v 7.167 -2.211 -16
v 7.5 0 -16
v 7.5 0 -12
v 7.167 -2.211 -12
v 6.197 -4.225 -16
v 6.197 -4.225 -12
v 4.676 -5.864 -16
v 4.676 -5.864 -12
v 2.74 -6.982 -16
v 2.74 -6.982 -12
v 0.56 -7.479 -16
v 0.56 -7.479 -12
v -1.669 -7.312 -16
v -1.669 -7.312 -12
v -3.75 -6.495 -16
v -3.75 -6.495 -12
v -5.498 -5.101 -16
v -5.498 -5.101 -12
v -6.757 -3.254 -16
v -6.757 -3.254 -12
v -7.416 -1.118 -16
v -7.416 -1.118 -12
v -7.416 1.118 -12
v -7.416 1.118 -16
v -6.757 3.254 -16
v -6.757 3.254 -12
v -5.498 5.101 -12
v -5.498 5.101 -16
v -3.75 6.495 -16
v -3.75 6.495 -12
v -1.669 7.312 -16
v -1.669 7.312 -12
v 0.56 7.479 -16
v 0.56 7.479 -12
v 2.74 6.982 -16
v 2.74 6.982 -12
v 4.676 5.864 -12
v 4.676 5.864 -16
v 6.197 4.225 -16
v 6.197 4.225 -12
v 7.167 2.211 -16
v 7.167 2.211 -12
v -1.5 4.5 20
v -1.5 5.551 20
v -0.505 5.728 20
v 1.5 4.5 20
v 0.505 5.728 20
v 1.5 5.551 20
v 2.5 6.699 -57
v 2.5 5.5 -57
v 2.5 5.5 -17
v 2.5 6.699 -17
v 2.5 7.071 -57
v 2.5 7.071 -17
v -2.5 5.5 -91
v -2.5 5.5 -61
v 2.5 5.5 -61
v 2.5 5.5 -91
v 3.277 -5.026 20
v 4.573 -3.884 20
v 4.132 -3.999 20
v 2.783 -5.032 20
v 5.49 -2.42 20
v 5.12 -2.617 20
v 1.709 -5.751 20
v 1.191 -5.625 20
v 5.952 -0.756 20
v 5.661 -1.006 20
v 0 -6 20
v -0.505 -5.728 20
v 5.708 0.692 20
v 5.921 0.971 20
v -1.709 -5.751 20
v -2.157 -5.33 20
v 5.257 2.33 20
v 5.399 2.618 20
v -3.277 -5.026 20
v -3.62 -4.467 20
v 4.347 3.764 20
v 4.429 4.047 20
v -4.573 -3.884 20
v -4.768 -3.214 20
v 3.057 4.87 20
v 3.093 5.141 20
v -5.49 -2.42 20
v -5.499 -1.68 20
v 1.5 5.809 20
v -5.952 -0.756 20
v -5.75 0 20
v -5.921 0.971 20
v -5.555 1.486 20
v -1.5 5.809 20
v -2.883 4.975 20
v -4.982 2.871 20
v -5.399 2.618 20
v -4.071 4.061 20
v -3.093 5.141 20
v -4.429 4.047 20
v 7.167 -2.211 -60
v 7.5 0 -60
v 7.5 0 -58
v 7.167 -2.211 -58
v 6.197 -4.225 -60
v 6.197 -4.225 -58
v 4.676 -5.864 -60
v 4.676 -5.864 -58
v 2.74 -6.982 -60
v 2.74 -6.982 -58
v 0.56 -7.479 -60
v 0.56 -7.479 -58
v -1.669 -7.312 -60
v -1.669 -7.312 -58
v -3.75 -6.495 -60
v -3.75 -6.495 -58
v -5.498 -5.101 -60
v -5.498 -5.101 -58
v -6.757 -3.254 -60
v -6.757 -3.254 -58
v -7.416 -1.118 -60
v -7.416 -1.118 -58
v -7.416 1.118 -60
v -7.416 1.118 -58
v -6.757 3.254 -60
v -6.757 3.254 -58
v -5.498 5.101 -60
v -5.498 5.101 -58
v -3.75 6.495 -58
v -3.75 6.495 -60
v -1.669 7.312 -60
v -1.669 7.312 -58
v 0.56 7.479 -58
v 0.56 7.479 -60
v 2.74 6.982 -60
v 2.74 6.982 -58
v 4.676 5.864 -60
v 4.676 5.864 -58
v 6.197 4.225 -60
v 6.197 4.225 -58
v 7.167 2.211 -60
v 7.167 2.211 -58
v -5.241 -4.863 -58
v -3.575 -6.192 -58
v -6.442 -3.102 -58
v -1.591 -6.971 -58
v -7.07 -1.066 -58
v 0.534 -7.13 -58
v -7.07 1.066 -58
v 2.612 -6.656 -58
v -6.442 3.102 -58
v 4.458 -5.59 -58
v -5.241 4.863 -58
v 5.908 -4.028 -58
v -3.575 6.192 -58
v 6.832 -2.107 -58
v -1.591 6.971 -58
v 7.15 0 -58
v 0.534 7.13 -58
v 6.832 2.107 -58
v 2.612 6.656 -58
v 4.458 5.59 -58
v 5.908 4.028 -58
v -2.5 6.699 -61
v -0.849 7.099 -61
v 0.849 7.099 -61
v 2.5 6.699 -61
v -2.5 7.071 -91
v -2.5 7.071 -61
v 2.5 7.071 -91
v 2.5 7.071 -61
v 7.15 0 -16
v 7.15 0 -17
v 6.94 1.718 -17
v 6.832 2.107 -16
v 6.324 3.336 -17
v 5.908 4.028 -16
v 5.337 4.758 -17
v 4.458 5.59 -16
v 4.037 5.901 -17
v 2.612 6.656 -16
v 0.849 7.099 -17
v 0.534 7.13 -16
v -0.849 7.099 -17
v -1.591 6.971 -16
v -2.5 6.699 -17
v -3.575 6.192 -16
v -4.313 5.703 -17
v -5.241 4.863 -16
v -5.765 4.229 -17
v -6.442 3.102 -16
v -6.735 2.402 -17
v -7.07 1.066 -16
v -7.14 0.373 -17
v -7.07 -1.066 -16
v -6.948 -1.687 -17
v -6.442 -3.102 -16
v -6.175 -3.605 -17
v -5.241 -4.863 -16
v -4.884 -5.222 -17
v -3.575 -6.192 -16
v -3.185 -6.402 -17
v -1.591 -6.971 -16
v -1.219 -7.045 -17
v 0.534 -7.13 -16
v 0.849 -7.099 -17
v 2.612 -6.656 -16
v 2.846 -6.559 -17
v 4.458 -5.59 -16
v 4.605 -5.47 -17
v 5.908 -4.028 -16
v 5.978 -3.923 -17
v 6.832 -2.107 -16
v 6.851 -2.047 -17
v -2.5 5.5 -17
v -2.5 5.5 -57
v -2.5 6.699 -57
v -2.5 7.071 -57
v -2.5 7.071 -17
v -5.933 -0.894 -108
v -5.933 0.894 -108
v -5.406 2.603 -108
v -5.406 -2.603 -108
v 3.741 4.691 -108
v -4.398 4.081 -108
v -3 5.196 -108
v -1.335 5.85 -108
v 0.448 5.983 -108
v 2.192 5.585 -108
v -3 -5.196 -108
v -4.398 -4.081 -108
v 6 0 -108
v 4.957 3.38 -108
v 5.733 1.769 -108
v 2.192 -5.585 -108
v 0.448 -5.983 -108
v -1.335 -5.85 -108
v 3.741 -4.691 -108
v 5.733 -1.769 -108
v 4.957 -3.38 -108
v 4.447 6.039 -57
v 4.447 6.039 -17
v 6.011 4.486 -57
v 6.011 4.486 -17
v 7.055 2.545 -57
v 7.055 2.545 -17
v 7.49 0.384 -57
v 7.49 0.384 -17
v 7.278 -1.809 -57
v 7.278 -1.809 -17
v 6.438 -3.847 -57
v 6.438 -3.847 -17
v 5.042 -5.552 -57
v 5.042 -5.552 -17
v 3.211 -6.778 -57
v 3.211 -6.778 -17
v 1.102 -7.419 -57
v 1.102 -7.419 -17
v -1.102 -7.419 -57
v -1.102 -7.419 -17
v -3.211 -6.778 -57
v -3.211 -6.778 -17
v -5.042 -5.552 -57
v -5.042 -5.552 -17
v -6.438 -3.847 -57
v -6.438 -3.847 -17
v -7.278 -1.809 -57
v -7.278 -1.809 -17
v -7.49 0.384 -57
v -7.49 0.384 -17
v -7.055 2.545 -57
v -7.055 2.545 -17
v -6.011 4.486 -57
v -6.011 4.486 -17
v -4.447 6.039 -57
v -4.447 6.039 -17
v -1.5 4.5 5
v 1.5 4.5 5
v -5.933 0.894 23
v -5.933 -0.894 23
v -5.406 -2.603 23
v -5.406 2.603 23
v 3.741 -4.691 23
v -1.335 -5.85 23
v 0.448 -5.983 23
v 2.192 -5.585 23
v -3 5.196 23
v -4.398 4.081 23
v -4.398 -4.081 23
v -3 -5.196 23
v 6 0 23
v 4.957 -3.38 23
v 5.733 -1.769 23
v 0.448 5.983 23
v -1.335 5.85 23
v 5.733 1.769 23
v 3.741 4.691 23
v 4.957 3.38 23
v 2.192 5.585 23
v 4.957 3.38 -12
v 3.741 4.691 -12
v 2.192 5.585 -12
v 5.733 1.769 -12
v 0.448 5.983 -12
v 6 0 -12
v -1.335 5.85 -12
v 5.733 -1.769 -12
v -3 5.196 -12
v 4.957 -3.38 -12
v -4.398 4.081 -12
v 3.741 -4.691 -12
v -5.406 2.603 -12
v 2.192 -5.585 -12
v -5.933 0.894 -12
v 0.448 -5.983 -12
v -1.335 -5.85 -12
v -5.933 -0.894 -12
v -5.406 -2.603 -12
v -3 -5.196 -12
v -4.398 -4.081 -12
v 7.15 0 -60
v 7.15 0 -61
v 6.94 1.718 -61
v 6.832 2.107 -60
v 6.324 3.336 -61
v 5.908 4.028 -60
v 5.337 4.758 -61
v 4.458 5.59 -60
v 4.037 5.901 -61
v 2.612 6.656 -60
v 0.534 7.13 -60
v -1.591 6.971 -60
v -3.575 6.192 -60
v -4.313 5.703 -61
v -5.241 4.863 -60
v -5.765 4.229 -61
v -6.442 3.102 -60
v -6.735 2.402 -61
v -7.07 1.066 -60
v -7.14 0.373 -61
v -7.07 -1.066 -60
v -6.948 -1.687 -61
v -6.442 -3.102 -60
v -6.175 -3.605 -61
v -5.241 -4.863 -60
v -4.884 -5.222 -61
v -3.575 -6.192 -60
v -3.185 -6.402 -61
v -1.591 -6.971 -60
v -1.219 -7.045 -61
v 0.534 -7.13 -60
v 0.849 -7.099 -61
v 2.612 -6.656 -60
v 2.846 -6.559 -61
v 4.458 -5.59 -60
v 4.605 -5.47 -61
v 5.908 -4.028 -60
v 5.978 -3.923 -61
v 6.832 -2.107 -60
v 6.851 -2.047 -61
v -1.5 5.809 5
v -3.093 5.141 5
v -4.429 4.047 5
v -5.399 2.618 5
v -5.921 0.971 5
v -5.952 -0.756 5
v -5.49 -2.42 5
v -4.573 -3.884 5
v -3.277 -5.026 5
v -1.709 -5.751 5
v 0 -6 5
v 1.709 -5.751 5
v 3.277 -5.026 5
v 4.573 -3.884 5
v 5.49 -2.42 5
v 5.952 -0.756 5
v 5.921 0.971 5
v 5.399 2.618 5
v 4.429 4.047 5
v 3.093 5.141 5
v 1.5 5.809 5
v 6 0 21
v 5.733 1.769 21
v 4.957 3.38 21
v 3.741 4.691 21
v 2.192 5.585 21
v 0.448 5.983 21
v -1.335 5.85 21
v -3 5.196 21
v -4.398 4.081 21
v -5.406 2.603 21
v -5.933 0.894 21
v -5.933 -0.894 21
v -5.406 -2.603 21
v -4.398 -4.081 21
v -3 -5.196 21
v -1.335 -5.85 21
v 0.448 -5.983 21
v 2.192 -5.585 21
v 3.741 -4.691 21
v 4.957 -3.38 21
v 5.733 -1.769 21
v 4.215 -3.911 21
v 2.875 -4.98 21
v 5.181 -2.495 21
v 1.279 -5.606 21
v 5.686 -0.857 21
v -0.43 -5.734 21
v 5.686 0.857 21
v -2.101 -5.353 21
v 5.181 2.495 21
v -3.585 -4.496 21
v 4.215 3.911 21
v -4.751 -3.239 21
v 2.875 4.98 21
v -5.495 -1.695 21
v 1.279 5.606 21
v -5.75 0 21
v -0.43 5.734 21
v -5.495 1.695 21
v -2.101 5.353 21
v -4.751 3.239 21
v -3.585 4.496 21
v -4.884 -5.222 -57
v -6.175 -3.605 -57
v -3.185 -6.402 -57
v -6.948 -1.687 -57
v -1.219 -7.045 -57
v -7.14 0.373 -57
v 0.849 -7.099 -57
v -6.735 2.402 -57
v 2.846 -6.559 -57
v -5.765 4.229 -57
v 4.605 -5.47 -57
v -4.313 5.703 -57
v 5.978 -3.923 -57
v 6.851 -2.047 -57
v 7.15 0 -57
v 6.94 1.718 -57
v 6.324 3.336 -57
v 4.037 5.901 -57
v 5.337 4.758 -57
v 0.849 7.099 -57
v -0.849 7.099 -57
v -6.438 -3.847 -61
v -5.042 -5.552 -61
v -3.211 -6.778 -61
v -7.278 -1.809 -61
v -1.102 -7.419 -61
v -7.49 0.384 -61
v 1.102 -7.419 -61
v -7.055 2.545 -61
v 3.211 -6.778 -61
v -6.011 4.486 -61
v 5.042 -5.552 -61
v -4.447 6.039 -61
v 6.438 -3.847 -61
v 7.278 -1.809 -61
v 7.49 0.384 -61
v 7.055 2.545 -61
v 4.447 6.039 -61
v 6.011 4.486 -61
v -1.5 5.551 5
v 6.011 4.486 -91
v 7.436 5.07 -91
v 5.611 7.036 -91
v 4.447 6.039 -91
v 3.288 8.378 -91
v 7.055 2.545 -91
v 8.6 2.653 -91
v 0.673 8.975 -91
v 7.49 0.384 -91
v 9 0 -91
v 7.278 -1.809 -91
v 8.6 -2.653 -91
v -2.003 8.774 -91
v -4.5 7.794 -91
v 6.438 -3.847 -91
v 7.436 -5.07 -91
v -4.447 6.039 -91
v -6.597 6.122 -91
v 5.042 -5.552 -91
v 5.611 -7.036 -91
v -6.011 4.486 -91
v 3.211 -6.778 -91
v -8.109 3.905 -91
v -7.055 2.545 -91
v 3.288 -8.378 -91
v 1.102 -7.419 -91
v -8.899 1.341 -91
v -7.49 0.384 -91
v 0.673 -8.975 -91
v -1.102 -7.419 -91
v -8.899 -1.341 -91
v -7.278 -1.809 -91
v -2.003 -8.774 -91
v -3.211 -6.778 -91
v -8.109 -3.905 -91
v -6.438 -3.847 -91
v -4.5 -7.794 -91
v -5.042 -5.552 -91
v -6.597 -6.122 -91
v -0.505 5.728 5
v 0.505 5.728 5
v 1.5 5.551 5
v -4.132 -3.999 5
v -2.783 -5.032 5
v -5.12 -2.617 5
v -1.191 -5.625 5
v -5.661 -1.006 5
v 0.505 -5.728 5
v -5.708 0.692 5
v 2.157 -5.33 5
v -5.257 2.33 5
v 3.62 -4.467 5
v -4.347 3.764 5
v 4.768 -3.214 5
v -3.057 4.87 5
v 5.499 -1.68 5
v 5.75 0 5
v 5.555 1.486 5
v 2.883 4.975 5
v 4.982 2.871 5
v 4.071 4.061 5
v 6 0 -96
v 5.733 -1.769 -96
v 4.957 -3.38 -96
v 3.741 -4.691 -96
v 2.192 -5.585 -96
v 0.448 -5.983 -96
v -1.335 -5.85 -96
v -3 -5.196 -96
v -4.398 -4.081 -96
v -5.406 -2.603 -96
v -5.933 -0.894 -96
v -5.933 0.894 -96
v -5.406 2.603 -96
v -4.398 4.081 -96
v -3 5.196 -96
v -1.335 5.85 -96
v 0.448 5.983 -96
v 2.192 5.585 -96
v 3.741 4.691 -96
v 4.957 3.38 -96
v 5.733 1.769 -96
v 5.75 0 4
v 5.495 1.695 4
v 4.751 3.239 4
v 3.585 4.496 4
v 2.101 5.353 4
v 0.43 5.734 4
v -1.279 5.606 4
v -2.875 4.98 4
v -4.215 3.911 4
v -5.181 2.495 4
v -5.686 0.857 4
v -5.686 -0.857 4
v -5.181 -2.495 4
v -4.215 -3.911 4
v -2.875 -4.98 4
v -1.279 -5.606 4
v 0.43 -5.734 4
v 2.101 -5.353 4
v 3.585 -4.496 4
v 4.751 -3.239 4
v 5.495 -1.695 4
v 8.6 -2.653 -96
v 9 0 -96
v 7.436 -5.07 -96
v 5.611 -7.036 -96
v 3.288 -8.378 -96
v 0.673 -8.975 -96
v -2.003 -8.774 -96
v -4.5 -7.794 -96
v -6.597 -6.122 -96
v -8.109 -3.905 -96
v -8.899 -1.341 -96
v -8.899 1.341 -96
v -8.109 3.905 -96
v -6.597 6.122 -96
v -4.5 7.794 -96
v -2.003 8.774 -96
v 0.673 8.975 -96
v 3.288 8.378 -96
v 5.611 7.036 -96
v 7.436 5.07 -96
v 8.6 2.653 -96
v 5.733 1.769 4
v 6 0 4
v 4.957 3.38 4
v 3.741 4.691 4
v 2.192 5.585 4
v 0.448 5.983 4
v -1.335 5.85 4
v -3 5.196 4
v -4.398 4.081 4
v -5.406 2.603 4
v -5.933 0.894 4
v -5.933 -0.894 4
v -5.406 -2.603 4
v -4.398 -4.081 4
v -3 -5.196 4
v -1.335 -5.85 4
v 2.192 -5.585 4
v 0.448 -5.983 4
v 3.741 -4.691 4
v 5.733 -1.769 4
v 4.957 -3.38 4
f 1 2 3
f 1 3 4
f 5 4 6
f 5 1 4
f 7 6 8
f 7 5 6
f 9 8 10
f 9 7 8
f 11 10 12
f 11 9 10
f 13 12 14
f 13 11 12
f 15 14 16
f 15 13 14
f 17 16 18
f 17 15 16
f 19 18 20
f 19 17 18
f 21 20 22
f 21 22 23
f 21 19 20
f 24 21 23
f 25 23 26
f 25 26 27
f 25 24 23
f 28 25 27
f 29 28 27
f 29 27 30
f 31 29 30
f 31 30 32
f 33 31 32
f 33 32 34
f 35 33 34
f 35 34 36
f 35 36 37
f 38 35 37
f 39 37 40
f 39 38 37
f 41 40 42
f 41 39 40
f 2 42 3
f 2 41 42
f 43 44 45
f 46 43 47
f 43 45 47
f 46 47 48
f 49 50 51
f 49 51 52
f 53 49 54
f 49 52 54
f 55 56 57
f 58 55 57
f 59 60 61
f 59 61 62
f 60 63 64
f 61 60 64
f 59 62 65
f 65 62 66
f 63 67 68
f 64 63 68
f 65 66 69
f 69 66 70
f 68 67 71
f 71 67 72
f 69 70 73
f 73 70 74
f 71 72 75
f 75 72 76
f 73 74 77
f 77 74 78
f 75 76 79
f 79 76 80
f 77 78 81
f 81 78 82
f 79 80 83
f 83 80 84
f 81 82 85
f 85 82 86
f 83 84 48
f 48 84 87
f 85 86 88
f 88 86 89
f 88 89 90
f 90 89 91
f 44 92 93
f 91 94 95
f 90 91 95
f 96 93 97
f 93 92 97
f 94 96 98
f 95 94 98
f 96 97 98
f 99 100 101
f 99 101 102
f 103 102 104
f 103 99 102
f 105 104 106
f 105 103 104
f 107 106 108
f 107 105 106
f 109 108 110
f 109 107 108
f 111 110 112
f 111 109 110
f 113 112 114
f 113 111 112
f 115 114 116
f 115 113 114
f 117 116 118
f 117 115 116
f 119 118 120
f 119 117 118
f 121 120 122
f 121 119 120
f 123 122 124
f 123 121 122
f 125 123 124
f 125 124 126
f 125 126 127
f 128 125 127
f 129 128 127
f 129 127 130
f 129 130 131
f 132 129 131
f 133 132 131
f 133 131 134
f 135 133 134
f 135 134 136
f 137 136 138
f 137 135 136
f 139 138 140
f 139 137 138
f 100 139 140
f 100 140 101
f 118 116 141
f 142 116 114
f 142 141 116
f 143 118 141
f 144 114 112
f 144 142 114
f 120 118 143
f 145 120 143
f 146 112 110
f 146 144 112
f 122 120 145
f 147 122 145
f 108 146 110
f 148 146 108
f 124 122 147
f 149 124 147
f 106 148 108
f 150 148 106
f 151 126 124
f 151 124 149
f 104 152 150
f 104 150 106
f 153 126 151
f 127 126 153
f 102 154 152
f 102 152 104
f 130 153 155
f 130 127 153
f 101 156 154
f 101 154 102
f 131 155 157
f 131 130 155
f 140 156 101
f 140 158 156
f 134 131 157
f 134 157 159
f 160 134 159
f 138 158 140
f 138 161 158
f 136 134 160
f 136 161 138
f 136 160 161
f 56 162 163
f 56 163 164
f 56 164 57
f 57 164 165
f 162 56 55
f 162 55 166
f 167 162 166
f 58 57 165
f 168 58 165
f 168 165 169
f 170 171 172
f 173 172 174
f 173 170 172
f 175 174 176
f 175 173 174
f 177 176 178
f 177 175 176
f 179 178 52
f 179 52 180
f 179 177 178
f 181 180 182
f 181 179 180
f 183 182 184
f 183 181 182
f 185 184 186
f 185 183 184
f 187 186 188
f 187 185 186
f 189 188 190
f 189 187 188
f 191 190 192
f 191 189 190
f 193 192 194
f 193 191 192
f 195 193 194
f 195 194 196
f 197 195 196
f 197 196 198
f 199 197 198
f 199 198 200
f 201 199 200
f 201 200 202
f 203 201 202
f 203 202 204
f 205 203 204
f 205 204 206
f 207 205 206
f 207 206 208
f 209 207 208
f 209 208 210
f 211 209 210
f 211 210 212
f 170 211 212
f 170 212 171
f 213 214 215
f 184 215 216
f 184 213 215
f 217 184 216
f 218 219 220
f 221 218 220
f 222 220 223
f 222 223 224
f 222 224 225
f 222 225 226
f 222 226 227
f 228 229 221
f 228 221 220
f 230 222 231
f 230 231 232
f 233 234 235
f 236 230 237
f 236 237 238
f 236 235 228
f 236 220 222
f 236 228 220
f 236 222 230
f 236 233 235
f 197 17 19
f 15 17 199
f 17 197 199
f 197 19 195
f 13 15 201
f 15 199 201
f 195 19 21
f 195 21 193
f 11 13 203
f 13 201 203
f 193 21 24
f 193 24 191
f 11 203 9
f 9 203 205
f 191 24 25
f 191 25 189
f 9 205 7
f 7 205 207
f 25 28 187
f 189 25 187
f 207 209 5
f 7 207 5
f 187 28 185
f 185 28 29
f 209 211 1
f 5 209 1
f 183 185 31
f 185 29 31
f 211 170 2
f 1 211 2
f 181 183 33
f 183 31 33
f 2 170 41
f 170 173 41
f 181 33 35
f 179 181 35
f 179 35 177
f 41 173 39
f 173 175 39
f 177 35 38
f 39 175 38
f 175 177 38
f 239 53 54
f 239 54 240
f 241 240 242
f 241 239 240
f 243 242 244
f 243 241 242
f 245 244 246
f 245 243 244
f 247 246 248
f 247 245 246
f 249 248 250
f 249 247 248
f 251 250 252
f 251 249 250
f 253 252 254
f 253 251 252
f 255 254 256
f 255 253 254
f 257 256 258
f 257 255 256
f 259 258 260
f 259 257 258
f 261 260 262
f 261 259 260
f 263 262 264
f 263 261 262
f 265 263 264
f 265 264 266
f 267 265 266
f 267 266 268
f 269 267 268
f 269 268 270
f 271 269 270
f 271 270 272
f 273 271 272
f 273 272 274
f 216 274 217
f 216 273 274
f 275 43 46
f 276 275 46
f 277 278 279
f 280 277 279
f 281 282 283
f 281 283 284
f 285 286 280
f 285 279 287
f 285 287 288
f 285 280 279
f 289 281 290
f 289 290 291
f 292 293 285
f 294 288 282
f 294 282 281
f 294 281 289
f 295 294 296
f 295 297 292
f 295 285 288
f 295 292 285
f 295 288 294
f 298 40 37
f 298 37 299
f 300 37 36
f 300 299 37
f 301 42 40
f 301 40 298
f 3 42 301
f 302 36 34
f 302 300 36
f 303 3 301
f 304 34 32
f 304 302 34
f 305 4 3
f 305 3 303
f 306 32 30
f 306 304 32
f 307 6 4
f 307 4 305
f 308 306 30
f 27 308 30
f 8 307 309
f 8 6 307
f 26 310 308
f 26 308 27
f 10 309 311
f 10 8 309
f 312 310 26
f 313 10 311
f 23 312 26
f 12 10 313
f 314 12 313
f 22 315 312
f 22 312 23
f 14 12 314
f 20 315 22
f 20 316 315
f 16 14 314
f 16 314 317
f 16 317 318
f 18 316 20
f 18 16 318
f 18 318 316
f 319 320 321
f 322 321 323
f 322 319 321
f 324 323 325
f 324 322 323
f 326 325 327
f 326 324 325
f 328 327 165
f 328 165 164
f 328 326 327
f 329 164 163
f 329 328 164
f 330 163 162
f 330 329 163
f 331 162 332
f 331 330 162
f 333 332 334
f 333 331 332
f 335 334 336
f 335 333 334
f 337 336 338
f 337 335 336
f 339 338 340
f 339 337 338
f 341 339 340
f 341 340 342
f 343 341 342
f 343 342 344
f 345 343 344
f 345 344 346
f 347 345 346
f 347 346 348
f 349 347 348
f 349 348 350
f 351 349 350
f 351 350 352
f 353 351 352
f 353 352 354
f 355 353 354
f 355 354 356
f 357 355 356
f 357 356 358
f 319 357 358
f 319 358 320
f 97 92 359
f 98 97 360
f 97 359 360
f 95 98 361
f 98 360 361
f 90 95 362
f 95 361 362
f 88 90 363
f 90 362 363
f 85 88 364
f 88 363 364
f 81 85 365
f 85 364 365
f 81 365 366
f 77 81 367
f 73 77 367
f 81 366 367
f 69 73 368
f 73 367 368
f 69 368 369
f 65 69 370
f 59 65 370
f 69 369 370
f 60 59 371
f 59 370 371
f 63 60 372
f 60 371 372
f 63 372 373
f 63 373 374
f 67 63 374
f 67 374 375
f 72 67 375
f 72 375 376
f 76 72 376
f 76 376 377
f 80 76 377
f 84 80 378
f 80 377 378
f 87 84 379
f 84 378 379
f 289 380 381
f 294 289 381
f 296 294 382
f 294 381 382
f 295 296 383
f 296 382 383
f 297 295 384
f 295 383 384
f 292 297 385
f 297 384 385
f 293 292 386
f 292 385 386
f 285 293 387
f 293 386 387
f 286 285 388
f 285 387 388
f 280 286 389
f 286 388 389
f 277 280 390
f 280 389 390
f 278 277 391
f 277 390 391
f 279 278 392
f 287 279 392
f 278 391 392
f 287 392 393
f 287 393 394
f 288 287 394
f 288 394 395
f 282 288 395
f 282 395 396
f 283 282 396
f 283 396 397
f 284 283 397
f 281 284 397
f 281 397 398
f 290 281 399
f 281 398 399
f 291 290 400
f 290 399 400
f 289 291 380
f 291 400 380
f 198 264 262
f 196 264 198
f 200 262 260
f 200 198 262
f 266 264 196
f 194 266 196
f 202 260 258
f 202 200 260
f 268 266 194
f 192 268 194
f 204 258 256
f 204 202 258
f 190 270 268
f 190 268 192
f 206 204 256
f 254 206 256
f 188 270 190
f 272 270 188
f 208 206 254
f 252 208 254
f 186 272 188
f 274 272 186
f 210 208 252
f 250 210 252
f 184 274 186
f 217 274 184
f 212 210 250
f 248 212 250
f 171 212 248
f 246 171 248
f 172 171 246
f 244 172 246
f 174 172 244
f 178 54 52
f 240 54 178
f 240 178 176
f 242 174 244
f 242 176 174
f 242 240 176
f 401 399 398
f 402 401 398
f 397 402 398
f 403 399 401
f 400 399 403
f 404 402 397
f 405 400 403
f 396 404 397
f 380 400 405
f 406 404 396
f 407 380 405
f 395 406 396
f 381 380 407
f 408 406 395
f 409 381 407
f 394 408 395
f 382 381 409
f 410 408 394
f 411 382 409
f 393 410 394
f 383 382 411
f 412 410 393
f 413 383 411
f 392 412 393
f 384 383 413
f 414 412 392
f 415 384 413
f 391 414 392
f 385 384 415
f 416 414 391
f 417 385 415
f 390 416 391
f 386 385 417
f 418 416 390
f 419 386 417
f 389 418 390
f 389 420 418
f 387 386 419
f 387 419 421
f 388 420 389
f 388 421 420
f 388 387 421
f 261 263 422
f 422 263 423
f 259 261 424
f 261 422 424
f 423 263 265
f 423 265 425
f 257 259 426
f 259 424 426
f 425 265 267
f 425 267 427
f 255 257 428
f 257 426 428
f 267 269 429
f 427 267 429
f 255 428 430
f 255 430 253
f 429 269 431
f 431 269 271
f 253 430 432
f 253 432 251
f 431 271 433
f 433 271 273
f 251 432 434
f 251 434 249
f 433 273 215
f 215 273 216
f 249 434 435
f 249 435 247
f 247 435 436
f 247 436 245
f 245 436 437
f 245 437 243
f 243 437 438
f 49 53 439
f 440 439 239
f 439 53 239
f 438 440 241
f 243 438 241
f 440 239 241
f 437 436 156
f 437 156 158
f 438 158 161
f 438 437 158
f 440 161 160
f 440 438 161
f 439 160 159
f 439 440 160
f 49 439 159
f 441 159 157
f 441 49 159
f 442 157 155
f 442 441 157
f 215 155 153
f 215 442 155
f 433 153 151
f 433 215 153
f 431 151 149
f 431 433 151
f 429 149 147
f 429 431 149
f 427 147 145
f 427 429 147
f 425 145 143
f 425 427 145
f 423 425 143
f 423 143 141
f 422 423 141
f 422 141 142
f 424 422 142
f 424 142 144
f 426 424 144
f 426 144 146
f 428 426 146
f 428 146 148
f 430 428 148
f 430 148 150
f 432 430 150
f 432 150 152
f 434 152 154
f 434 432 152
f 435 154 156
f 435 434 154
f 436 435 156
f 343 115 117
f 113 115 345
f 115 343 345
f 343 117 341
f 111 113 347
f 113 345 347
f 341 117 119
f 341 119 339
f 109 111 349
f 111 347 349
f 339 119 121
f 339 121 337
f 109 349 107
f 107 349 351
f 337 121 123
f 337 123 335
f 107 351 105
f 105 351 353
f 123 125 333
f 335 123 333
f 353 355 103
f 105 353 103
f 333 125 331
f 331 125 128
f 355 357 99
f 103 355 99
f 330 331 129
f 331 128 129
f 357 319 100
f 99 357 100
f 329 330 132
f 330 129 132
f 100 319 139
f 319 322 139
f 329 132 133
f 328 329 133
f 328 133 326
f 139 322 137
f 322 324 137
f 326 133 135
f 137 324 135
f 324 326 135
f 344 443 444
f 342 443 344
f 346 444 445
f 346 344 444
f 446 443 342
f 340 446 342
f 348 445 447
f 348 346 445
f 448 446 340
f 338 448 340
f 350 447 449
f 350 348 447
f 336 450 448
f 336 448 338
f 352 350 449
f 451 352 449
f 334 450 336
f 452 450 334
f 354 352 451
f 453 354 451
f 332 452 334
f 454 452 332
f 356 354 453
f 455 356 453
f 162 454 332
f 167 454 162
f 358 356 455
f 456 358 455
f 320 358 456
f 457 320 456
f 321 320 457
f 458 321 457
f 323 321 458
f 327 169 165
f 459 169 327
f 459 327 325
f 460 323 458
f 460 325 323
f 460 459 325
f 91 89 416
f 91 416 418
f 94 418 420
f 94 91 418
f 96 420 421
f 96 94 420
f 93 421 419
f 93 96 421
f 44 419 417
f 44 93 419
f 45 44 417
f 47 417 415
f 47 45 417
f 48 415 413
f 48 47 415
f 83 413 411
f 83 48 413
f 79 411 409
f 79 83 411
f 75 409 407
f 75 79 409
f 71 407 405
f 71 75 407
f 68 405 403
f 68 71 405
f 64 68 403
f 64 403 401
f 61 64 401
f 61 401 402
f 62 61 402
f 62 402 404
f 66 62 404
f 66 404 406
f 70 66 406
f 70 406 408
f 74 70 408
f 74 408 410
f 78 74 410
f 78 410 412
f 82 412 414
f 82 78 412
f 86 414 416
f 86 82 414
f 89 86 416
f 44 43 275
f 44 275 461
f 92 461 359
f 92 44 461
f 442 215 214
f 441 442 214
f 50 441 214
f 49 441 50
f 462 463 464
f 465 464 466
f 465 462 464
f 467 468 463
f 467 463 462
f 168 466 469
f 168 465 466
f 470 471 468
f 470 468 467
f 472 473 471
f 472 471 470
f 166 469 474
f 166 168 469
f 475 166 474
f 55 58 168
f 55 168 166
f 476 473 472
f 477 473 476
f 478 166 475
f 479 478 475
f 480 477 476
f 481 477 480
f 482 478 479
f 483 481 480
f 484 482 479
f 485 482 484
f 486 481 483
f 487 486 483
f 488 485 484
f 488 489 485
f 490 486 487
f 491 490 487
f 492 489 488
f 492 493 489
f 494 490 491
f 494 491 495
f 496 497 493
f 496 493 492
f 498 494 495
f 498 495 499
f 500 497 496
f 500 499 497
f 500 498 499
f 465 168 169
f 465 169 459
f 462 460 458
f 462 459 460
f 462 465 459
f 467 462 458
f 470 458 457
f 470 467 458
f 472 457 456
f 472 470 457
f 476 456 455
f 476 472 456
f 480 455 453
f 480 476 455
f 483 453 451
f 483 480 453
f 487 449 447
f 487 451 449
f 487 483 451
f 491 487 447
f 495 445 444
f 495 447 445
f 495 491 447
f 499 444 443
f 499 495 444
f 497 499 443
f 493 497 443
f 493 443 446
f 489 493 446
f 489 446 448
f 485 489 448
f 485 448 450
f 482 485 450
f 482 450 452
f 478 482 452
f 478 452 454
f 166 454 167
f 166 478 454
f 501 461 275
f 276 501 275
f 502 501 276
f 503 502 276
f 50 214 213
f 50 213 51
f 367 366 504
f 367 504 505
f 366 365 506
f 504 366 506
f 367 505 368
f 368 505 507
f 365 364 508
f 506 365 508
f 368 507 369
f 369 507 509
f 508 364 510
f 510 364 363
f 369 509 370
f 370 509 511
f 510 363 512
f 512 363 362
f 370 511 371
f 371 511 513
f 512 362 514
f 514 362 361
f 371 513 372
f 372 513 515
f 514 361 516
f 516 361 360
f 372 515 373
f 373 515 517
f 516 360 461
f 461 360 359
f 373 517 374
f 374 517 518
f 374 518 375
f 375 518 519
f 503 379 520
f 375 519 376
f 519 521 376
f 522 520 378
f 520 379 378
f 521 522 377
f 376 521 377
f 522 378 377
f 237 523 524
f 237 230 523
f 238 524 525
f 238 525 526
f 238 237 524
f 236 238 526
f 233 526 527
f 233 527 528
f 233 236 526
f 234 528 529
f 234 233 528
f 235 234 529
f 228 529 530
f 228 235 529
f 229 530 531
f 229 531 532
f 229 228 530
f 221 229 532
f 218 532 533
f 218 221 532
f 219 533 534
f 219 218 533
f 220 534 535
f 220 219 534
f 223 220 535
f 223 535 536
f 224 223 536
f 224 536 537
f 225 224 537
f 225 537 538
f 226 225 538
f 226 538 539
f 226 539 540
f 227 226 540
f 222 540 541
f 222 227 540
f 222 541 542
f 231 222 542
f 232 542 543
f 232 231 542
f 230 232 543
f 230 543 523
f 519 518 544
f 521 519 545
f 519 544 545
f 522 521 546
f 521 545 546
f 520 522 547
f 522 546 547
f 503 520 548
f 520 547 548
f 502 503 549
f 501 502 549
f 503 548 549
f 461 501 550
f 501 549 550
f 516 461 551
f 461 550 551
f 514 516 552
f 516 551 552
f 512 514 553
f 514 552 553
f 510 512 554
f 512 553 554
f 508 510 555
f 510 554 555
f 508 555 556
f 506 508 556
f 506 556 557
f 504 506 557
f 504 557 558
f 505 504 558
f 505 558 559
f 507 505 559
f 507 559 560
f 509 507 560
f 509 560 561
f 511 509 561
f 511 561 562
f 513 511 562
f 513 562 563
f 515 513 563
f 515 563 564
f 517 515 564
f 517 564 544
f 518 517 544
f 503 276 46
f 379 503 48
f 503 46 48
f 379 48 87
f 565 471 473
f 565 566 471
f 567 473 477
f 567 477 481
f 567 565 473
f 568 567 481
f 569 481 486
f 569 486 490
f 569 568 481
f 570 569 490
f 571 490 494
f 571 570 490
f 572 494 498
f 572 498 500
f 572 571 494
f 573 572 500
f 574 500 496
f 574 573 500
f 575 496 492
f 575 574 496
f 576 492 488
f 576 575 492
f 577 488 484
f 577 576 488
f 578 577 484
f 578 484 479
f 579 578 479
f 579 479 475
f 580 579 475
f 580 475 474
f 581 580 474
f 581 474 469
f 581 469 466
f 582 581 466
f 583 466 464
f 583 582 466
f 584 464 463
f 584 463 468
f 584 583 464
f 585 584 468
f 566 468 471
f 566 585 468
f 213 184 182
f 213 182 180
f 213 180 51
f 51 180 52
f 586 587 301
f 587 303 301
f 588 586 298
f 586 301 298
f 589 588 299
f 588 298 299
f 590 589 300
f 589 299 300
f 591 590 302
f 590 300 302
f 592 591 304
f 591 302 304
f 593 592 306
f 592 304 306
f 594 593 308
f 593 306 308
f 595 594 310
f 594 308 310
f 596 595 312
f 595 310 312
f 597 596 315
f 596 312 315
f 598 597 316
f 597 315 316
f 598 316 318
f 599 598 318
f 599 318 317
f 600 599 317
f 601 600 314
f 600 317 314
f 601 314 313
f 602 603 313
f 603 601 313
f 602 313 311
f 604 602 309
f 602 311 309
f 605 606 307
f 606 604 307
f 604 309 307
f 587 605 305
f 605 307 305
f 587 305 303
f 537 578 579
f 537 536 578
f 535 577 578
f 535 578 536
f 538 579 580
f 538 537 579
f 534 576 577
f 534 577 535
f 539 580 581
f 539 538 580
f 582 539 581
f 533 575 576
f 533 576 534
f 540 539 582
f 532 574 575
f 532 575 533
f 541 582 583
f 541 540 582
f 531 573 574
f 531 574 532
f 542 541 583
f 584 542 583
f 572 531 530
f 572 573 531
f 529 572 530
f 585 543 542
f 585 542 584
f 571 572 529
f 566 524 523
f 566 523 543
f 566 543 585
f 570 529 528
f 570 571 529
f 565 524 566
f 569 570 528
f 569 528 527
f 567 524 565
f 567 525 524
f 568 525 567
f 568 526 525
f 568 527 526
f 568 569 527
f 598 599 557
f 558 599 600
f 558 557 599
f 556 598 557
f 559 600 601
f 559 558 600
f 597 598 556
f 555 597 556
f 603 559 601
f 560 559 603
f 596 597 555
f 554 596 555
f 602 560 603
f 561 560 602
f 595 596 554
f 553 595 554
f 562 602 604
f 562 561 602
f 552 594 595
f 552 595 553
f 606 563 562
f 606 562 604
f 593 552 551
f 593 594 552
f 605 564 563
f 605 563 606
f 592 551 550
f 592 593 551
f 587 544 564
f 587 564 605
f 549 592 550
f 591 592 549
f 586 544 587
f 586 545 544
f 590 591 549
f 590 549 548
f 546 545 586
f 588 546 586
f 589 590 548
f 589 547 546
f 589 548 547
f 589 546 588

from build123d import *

# Parameters (mm, degrees)
CUT_EXTRUDE2_START  = -16
SKETCH7_R           = 10.15
SKETCH7_R_2         = 7.15
CUT_EXTRUDE2_DEPTH  = 1
SKETCH10_W          = 5
SKETCH10_H          = 3
CUT_EXTRUDE3_DEPTH  = 40
SKETCH11_R          = 10.15
SKETCH11_R_2        = 7.15
CUT_EXTRUDE4_DEPTH  = 1
CUT_EXTRUDE5_START  = -3
SKETCH13_R          = 10.15
SKETCH13_R_2        = 7.15
CUT_EXTRUDE5_DEPTH  = 1
CUT_EXTRUDE6_START  = -61
SKETCH14_W          = 5
SKETCH14_H          = 3
CUT_EXTRUDE6_DEPTH  = 30
SKETCH15_R          = 6
BOSS_EXTRUDE4_DEPTH = 20
SKETCH16_W          = 3
SKETCH16_H          = 1.5
CUT_EXTRUDE7_DEPTH  = 15
SKETCH17_R          = 6
BOSS_EXTRUDE5_DEPTH = 3
SKETCH18_R          = 6.5
SKETCH18_R_2        = 5.75
CUT_EXTRUDE8_DEPTH  = 1
CUT_EXTRUDE9_START  = -1
SKETCH19_R          = 6.5
SKETCH19_R_2        = 5.75
CUT_EXTRUDE9_DEPTH  = 1


with BuildPart() as part:
    # Sketch5 → Revolve1 (revolve)
    with BuildSketch(Plane(origin=(0, 0, 0), x_dir=(0, 0, -1), z_dir=(1, 0, 0)), mode=Mode.PRIVATE) as revolve1_sk:
        Polygon((0, 0), (0, 6), (12, 6), (12, 7.5), (91, 7.5), (91, 9), (96, 9), (96, 6), (108, 6), (108, 0), align=None)
    revolve(revolve1_sk.sketch.rotate(Axis((0, 0, 0), (0, 0, -1)), 90), axis=Axis((0, 0, 0), (0, 0, -1)))

    # Sketch7 → Cut-Extrude2 (cut)
    with BuildSketch(Plane.XY.offset(CUT_EXTRUDE2_START)):
        Circle(SKETCH7_R)
        Circle(SKETCH7_R_2, mode=Mode.SUBTRACT)
    extrude(amount=-CUT_EXTRUDE2_DEPTH, mode=Mode.SUBTRACT)

    # Sketch10 → Cut-Extrude3 (cut)
    with BuildSketch(Plane.XY.offset(-17)):
        with Locations((0, 7)):
            Rectangle(SKETCH10_W, SKETCH10_H)
    extrude(amount=-CUT_EXTRUDE3_DEPTH, mode=Mode.SUBTRACT)

    # Sketch11 → Cut-Extrude4 (cut)
    with BuildSketch(Plane.XY.offset(-57)):
        Circle(SKETCH11_R)
        Circle(SKETCH11_R_2, mode=Mode.SUBTRACT)
    extrude(amount=-CUT_EXTRUDE4_DEPTH, mode=Mode.SUBTRACT)

    # Sketch13 → Cut-Extrude5 (cut)
    with BuildSketch(Plane.XY.offset(-57).offset(CUT_EXTRUDE5_START)):
        Circle(SKETCH13_R)
        Circle(SKETCH13_R_2, mode=Mode.SUBTRACT)
    extrude(amount=-CUT_EXTRUDE5_DEPTH, mode=Mode.SUBTRACT)

    # Sketch14 → Cut-Extrude6 (cut)
    with BuildSketch(Plane.XY.offset(CUT_EXTRUDE6_START)):
        with Locations((0, 7)):
            Rectangle(SKETCH14_W, SKETCH14_H)
    extrude(amount=-CUT_EXTRUDE6_DEPTH, mode=Mode.SUBTRACT)

    # Sketch15 → Boss-Extrude4 (add)
    with BuildSketch(Plane.XY):
        Circle(SKETCH15_R)
    extrude(amount=BOSS_EXTRUDE4_DEPTH)

    # Sketch16 → Cut-Extrude7 (cut)
    with BuildSketch(Plane.XY.offset(20)):
        with Locations((0, 5.25)):
            Rectangle(SKETCH16_W, SKETCH16_H)
    extrude(amount=-CUT_EXTRUDE7_DEPTH, mode=Mode.SUBTRACT)

    # Sketch17 → Boss-Extrude5 (add)
    with BuildSketch(Plane.XY.offset(20)):
        Circle(SKETCH17_R)
    extrude(amount=BOSS_EXTRUDE5_DEPTH)

    # Sketch18 → Cut-Extrude8 (cut)
    with BuildSketch(Plane(origin=(0, 0, 20), x_dir=(-1, 0, 0), z_dir=(0, 0, -1))):
        Circle(SKETCH18_R)
        Circle(SKETCH18_R_2, mode=Mode.SUBTRACT)
    extrude(amount=-CUT_EXTRUDE8_DEPTH, mode=Mode.SUBTRACT)

    # Sketch19 → Cut-Extrude9 (cut)
    with BuildSketch(Plane.XY.offset(5).offset(CUT_EXTRUDE9_START)):
        Circle(SKETCH19_R)
        Circle(SKETCH19_R_2, mode=Mode.SUBTRACT)
    extrude(amount=CUT_EXTRUDE9_DEPTH, mode=Mode.SUBTRACT)


solid = part.part
